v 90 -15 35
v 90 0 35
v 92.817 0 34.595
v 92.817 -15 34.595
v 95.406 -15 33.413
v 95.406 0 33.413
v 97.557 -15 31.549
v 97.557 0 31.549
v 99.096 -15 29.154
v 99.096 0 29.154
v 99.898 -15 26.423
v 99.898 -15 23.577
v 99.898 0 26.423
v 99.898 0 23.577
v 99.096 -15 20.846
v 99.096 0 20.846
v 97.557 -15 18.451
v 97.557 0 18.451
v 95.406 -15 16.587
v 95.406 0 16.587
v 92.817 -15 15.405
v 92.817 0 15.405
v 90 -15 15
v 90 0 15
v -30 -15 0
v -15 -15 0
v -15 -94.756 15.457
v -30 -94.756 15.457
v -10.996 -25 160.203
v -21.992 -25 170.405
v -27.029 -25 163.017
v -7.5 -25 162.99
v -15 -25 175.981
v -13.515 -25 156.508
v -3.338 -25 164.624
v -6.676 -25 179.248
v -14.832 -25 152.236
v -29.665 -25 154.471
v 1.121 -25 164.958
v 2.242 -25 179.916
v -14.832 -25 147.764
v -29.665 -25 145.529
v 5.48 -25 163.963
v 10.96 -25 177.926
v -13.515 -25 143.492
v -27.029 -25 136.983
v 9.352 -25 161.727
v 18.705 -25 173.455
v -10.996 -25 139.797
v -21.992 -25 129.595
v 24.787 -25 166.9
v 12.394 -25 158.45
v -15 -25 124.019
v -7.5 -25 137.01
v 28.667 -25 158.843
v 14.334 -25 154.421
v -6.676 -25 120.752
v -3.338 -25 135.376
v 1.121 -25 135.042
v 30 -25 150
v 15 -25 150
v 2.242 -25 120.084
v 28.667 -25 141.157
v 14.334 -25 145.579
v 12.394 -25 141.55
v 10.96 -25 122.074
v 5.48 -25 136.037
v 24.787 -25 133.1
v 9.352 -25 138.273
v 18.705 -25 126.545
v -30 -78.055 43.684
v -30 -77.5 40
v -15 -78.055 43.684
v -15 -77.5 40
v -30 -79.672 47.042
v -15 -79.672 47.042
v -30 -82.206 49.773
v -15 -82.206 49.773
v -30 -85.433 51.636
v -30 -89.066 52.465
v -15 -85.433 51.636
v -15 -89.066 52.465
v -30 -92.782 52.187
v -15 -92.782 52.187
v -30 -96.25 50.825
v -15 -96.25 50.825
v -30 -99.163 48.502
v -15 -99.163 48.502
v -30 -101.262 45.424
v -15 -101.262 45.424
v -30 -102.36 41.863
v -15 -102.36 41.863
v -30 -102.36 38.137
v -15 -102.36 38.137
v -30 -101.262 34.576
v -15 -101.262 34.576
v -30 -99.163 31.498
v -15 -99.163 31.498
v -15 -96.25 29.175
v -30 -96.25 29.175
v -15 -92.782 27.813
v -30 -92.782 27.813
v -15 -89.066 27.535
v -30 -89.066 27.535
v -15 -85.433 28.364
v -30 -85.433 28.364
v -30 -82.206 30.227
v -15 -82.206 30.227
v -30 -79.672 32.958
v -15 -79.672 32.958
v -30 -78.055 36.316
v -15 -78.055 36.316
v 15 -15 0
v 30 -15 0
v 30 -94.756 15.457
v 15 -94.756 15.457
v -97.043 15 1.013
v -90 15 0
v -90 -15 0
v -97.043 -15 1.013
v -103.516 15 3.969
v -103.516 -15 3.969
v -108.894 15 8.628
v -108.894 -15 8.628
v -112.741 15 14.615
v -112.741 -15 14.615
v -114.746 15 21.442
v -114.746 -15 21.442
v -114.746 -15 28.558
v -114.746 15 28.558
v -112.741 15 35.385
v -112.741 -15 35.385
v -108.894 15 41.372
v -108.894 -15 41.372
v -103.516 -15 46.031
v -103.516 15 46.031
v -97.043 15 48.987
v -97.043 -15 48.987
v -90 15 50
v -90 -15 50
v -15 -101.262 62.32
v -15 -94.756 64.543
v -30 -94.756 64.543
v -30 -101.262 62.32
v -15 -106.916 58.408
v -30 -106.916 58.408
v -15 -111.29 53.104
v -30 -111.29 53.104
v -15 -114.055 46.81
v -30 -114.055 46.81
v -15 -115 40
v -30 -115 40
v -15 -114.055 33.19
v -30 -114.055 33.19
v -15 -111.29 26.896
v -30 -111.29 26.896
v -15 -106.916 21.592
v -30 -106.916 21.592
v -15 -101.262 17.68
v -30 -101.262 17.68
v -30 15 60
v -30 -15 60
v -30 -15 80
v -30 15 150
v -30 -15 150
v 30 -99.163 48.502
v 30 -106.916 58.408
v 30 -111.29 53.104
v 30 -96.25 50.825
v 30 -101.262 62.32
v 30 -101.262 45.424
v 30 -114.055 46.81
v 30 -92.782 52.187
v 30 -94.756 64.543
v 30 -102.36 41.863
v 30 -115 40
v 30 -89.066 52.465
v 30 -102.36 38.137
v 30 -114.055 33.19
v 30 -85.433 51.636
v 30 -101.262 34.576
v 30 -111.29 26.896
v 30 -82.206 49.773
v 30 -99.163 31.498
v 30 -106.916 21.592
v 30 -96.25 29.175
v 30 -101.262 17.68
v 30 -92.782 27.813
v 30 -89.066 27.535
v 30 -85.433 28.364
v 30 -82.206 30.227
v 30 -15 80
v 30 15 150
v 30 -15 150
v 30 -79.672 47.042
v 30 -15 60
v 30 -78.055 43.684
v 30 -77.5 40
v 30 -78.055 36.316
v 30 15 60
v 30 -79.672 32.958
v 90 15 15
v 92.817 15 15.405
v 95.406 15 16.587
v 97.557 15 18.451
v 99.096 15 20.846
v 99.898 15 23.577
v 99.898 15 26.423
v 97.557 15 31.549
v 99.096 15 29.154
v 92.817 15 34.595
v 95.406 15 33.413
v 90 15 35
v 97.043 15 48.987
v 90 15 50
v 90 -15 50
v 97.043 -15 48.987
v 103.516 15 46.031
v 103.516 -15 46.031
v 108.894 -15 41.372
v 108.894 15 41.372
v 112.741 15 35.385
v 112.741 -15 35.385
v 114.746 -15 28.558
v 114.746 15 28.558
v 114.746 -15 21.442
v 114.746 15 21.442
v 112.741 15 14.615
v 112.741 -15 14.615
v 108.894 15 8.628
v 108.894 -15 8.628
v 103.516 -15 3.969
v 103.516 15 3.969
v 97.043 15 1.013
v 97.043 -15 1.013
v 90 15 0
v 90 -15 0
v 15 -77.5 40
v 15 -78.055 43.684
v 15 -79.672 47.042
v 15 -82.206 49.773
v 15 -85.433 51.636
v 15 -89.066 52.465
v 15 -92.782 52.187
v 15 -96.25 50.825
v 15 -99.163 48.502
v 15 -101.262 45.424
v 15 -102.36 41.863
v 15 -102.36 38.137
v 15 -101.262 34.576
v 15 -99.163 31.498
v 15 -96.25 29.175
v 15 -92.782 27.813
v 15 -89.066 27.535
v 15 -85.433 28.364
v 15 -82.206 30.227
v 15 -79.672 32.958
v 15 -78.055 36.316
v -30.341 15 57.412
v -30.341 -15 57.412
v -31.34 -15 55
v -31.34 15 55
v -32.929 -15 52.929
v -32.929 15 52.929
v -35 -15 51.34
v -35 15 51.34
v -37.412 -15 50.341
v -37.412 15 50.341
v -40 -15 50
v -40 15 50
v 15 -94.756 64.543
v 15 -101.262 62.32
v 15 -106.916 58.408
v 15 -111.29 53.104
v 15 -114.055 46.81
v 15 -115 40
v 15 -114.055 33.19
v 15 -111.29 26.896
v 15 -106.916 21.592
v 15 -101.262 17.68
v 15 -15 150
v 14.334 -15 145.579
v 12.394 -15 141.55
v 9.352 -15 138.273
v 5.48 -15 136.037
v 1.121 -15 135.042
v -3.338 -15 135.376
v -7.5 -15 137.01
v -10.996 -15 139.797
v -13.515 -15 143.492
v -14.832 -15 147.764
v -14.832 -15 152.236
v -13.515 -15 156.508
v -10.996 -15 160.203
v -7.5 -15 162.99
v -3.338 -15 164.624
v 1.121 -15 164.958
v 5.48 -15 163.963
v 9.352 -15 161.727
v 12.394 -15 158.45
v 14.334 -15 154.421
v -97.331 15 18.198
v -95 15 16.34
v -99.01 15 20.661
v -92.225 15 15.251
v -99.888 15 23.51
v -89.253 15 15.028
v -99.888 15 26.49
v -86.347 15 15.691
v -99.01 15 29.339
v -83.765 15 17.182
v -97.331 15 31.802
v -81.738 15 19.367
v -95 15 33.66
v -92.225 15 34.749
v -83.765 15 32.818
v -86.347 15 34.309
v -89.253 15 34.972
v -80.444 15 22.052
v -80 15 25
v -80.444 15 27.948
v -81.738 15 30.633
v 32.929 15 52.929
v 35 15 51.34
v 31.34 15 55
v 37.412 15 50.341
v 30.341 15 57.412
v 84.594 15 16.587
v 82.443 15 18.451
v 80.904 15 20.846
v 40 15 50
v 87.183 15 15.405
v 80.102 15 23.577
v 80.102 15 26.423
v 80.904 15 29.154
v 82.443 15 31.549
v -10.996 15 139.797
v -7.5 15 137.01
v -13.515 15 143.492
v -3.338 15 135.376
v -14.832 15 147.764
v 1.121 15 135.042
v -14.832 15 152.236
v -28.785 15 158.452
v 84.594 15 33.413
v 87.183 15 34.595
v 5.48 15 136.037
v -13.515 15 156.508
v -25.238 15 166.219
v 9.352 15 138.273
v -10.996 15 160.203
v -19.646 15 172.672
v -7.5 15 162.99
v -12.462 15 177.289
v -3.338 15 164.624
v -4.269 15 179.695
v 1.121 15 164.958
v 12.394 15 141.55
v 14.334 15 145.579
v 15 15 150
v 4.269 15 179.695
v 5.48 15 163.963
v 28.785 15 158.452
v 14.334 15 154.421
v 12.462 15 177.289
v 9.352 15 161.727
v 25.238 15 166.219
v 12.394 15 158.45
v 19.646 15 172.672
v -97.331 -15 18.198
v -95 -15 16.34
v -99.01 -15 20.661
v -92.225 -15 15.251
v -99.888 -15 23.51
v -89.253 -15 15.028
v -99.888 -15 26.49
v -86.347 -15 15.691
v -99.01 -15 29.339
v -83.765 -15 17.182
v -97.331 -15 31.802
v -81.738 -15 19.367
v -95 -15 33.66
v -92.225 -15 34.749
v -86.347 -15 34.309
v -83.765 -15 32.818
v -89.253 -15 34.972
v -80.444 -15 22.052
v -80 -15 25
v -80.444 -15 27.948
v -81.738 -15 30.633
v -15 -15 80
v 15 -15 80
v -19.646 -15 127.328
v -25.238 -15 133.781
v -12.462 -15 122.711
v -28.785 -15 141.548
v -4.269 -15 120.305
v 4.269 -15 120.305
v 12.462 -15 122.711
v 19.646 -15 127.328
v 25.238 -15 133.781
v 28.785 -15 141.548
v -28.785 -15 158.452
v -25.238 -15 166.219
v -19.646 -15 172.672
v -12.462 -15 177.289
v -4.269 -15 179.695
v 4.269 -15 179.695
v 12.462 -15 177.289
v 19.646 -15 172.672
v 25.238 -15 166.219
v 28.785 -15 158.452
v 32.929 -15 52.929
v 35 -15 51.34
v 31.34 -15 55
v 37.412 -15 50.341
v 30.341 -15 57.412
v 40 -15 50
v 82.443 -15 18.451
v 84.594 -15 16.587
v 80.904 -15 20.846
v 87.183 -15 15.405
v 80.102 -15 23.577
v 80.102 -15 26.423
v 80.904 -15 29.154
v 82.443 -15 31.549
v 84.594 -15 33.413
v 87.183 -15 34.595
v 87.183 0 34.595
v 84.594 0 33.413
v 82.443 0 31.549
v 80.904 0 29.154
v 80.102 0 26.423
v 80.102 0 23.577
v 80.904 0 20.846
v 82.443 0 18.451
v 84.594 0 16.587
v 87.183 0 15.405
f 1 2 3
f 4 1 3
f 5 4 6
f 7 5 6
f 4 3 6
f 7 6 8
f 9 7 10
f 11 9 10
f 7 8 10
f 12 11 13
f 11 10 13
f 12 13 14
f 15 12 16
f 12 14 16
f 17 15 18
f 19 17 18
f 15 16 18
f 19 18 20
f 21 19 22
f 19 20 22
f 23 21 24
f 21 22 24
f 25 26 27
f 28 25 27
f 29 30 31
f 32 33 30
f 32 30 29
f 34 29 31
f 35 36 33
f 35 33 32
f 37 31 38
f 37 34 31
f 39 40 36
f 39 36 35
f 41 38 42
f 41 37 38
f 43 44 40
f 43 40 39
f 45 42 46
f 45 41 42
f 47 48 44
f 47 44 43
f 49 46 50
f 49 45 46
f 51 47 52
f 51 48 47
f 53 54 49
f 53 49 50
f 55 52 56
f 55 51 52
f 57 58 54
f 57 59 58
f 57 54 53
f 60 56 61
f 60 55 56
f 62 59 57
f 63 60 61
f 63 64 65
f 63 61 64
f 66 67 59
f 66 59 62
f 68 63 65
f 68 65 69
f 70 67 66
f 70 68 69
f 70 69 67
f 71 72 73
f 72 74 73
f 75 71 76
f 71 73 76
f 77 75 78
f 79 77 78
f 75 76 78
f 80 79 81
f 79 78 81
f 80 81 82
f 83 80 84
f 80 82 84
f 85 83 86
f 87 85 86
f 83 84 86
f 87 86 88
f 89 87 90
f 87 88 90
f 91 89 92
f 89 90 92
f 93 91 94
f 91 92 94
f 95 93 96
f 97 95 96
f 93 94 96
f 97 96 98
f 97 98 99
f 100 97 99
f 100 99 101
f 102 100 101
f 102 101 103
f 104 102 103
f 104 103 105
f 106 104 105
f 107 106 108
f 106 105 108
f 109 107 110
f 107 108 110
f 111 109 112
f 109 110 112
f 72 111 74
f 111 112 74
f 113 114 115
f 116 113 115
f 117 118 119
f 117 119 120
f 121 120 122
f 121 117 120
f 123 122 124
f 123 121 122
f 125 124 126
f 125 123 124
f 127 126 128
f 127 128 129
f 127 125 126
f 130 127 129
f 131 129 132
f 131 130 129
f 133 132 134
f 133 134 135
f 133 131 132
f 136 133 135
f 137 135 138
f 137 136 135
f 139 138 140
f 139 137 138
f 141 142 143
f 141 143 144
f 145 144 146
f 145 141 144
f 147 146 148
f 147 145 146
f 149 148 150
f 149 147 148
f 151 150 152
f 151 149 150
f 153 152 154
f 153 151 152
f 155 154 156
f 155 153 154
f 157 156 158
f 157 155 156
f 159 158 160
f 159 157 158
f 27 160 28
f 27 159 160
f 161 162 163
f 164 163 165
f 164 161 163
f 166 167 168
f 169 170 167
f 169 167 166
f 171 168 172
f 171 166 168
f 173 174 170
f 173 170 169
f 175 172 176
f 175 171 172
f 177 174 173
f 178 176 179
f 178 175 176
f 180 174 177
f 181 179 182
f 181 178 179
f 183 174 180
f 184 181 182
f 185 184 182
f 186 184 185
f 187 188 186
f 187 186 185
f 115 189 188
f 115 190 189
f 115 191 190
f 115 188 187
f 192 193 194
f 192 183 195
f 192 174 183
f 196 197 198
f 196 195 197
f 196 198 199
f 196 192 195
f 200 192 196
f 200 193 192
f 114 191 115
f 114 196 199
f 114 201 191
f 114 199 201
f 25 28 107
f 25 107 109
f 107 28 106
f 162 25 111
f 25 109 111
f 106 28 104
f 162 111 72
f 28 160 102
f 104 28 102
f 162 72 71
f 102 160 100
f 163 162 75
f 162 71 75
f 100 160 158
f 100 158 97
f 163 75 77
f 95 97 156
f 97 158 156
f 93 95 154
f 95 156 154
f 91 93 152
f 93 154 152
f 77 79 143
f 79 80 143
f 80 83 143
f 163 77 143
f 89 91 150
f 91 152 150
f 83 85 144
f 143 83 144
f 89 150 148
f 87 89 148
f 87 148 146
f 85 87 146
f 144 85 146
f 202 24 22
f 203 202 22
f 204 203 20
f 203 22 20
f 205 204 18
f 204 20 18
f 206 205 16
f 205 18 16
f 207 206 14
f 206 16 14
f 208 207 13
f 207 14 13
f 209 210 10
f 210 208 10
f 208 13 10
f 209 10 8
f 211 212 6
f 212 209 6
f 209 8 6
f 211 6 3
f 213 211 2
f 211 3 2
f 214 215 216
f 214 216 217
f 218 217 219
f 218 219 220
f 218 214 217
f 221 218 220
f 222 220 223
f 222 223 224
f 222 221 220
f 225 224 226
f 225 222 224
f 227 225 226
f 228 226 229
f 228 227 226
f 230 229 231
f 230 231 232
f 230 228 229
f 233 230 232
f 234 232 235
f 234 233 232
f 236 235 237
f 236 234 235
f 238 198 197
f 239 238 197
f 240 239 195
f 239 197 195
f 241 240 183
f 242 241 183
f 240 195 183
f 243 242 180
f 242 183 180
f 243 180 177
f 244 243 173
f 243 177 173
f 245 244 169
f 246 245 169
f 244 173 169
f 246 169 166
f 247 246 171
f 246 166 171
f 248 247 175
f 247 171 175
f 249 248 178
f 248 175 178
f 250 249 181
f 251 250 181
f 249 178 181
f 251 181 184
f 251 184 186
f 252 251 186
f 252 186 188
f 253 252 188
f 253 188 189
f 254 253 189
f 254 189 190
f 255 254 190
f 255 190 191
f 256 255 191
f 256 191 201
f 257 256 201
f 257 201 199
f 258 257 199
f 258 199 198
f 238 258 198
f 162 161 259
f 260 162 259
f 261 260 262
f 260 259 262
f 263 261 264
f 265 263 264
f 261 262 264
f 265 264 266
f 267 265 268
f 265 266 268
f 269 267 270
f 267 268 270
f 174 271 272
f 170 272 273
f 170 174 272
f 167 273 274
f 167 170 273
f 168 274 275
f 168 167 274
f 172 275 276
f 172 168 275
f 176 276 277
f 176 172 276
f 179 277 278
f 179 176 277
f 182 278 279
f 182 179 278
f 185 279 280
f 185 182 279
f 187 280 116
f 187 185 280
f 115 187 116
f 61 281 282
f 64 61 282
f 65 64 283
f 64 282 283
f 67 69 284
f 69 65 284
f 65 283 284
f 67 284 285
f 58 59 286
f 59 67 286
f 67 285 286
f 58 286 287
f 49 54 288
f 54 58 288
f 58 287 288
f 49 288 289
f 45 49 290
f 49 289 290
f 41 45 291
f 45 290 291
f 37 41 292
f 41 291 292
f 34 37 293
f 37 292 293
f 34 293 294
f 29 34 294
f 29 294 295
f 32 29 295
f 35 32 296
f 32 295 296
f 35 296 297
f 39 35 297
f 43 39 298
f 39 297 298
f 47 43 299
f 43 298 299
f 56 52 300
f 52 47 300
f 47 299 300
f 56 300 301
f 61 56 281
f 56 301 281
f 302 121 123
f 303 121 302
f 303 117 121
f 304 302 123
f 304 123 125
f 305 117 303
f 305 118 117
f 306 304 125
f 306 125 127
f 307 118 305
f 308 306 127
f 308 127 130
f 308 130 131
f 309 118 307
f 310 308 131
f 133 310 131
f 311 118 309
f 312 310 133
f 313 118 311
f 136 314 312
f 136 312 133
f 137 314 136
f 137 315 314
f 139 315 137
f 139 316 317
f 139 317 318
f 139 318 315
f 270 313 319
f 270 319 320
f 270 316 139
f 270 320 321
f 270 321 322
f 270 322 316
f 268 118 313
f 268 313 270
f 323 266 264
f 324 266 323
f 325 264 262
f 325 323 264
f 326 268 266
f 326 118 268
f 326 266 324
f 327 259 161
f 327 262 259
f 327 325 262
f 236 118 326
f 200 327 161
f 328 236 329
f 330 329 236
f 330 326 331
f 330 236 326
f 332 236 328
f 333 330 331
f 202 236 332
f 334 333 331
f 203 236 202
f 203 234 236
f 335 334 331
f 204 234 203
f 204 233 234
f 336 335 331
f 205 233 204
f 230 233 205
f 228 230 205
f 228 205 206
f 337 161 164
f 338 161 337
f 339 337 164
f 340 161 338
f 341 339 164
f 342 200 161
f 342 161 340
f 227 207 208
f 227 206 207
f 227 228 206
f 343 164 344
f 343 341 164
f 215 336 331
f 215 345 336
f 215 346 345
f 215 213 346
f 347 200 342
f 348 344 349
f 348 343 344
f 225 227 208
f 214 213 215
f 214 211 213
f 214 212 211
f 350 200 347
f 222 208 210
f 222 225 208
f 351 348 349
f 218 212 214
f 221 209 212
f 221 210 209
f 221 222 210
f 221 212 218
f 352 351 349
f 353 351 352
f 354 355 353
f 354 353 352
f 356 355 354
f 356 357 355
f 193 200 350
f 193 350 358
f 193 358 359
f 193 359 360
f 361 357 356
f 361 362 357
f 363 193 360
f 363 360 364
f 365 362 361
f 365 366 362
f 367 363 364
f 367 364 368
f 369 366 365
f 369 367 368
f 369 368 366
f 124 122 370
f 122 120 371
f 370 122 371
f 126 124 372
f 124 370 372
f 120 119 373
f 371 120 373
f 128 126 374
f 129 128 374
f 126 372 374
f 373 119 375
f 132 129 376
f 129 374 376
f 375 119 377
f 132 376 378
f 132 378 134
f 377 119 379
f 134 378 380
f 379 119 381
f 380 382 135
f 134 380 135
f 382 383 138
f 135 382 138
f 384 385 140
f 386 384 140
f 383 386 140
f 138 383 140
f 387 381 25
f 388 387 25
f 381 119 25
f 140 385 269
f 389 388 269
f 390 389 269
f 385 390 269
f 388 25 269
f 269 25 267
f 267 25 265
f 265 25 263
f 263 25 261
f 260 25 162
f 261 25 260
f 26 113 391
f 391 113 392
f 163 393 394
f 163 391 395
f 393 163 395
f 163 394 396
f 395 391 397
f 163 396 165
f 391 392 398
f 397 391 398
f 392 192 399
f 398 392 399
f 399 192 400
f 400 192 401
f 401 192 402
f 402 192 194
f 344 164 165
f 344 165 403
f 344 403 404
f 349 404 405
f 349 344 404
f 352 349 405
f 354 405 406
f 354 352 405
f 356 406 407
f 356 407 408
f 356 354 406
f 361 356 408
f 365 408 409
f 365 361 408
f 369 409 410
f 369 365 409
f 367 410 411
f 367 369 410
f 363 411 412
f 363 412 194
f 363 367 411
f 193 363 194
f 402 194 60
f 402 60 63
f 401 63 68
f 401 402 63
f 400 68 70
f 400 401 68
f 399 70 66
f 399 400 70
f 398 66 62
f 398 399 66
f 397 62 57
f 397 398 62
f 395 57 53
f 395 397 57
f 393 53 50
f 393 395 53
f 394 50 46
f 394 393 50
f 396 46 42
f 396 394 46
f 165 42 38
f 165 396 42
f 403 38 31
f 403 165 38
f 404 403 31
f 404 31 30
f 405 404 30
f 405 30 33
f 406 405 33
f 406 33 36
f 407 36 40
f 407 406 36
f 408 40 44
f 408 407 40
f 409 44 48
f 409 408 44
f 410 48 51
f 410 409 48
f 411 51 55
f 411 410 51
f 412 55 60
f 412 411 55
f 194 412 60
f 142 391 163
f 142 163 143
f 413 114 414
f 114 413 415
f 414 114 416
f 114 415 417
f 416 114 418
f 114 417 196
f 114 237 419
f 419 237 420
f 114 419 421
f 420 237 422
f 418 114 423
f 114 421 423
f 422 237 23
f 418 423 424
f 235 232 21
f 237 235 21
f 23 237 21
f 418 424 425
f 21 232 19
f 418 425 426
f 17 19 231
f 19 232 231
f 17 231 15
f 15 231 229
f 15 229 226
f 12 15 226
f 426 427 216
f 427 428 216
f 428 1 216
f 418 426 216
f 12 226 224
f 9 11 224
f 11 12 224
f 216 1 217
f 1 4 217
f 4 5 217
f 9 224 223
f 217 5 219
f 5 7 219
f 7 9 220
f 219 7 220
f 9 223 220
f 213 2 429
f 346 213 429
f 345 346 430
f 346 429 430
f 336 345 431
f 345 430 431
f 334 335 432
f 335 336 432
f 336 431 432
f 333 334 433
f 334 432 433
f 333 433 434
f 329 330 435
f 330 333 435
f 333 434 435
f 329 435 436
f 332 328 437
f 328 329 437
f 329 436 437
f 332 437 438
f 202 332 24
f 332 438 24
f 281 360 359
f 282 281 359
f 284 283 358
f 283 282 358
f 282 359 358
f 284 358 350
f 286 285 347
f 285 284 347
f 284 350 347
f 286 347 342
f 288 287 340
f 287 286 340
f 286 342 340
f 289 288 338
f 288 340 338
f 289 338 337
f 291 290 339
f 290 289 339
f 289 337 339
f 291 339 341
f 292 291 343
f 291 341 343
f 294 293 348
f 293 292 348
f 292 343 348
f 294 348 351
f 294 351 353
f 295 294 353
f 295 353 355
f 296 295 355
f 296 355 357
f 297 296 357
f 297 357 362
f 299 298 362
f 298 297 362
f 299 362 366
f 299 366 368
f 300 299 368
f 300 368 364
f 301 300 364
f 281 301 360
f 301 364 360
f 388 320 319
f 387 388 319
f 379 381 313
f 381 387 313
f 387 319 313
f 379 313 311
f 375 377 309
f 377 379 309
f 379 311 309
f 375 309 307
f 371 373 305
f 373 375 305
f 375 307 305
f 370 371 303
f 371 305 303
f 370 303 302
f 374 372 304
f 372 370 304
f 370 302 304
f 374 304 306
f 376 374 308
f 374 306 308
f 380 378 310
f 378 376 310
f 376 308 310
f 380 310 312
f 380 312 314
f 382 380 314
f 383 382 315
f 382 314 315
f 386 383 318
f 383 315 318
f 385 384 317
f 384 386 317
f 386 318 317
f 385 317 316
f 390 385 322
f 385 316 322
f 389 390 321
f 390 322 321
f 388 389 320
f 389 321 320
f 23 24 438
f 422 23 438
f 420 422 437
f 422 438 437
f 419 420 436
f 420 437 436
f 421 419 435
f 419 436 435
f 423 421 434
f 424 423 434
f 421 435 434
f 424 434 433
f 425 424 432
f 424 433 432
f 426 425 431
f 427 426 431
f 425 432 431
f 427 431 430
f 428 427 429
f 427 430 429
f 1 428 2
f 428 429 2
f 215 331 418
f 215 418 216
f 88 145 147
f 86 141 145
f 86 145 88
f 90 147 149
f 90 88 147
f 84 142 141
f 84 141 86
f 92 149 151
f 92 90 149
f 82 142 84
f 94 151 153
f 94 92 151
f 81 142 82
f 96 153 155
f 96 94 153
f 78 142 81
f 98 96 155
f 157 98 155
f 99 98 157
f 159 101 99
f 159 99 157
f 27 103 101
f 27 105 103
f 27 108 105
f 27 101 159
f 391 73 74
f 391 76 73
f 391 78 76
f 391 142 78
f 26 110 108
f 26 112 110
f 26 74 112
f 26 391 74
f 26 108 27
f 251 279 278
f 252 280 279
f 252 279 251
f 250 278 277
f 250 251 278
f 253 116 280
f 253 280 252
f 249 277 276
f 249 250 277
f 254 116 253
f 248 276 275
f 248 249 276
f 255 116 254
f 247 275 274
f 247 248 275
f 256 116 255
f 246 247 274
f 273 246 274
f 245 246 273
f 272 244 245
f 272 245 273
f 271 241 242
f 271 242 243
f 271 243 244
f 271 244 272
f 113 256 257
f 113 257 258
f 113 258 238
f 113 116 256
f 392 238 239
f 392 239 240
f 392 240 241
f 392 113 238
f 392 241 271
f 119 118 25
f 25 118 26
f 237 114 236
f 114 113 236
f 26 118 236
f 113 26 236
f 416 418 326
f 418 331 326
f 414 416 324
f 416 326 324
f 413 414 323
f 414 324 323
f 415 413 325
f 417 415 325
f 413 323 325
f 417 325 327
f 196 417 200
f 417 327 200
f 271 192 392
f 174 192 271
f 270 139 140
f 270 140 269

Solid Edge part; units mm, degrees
sketch "Sketch1" plane through (0, 0, 0) normal (0, -1, 0) x (1, 0, 0)
  line L0 (30, 150) -> (30, 80)
  line L1 (30, 80) -> (30, 60)
  line L2 (40, 50) -> (90, 50)
  line L3 (0, 0) -> (90, 0)
  line L4 (0, 0) -> (-90, 0)
  line L5 (-90, 50) -> (-40, 50)
  line L6 (-30, 60) -> (-30, 80)
  line L7 (-30, 80) -> (-30, 150)
  arc A0 (40, 50) -> (30, 60) centre (40, 60) cw
  arc A1 (90, 50) -> (90, 0) centre (90, 25) cw
  arc A2 (-90, 0) -> (-90, 50) centre (-90, 25) cw
  arc A3 (-30, 60) -> (-40, 50) centre (-40, 60) cw
  arc A4 (-30, 150) -> (30, 150) centre (0, 150) cw
  circle A5 centre (0, 150) radius 15
  circle A6 centre (-90, 25) radius 10
  arc A7 (90, 15) -> (90, 35) centre (90, 25) cw
  arc A8 (90, 35) -> (90, 15) centre (90, 25) cw
extrude "Protrusion1" add sketch "Sketch1" along normal mid plane 30
sketch "Sketch2" plane through (0, -15, 90) normal (0, -1, 0) x (1, 0, 0)
  circle A0 centre (0, 60) radius 30
  circle A1 centre (0, 60) radius 15
extrude "ExtrudedProtrusion_2" add sketch "Sketch2" along normal blind 10
sketch "Sketch3" plane through (30, 0, 0) normal (1, 0, 0) x (0, 1, 0)
  line L0 (-15, 80) -> (-94.7565, 64.5434)
  line L1 (-15, 40) -> (-15, 80)
  line L2 (-15, 0) -> (-15, 40)
  line L3 (-15, 0) -> (-94.7565, 15.4566)
  arc A0 (-94.7565, 15.4567) -> (-94.7565, 64.5433) centre (-90, 40) cw
  circle A1 centre (-90, 40) radius 12.5
extrude "Protrusion2" add sketch "Sketch3" against normal up to vertex (60 mm away)
sketch "Sketch4" plane through (0, -15, 115) normal (0, -1, 0) x (1, 0, 0)
  line L0 (-15, -35) -> (-15, -115)
  line L1 (-15, -115) -> (15, -115)
  line L2 (15, -115) -> (15, -35)
  line L3 (-15, -35) -> (15, -35)
extrude "ExtrudedCutout_1" cut sketch "Sketch4" along normal blind 222.03
